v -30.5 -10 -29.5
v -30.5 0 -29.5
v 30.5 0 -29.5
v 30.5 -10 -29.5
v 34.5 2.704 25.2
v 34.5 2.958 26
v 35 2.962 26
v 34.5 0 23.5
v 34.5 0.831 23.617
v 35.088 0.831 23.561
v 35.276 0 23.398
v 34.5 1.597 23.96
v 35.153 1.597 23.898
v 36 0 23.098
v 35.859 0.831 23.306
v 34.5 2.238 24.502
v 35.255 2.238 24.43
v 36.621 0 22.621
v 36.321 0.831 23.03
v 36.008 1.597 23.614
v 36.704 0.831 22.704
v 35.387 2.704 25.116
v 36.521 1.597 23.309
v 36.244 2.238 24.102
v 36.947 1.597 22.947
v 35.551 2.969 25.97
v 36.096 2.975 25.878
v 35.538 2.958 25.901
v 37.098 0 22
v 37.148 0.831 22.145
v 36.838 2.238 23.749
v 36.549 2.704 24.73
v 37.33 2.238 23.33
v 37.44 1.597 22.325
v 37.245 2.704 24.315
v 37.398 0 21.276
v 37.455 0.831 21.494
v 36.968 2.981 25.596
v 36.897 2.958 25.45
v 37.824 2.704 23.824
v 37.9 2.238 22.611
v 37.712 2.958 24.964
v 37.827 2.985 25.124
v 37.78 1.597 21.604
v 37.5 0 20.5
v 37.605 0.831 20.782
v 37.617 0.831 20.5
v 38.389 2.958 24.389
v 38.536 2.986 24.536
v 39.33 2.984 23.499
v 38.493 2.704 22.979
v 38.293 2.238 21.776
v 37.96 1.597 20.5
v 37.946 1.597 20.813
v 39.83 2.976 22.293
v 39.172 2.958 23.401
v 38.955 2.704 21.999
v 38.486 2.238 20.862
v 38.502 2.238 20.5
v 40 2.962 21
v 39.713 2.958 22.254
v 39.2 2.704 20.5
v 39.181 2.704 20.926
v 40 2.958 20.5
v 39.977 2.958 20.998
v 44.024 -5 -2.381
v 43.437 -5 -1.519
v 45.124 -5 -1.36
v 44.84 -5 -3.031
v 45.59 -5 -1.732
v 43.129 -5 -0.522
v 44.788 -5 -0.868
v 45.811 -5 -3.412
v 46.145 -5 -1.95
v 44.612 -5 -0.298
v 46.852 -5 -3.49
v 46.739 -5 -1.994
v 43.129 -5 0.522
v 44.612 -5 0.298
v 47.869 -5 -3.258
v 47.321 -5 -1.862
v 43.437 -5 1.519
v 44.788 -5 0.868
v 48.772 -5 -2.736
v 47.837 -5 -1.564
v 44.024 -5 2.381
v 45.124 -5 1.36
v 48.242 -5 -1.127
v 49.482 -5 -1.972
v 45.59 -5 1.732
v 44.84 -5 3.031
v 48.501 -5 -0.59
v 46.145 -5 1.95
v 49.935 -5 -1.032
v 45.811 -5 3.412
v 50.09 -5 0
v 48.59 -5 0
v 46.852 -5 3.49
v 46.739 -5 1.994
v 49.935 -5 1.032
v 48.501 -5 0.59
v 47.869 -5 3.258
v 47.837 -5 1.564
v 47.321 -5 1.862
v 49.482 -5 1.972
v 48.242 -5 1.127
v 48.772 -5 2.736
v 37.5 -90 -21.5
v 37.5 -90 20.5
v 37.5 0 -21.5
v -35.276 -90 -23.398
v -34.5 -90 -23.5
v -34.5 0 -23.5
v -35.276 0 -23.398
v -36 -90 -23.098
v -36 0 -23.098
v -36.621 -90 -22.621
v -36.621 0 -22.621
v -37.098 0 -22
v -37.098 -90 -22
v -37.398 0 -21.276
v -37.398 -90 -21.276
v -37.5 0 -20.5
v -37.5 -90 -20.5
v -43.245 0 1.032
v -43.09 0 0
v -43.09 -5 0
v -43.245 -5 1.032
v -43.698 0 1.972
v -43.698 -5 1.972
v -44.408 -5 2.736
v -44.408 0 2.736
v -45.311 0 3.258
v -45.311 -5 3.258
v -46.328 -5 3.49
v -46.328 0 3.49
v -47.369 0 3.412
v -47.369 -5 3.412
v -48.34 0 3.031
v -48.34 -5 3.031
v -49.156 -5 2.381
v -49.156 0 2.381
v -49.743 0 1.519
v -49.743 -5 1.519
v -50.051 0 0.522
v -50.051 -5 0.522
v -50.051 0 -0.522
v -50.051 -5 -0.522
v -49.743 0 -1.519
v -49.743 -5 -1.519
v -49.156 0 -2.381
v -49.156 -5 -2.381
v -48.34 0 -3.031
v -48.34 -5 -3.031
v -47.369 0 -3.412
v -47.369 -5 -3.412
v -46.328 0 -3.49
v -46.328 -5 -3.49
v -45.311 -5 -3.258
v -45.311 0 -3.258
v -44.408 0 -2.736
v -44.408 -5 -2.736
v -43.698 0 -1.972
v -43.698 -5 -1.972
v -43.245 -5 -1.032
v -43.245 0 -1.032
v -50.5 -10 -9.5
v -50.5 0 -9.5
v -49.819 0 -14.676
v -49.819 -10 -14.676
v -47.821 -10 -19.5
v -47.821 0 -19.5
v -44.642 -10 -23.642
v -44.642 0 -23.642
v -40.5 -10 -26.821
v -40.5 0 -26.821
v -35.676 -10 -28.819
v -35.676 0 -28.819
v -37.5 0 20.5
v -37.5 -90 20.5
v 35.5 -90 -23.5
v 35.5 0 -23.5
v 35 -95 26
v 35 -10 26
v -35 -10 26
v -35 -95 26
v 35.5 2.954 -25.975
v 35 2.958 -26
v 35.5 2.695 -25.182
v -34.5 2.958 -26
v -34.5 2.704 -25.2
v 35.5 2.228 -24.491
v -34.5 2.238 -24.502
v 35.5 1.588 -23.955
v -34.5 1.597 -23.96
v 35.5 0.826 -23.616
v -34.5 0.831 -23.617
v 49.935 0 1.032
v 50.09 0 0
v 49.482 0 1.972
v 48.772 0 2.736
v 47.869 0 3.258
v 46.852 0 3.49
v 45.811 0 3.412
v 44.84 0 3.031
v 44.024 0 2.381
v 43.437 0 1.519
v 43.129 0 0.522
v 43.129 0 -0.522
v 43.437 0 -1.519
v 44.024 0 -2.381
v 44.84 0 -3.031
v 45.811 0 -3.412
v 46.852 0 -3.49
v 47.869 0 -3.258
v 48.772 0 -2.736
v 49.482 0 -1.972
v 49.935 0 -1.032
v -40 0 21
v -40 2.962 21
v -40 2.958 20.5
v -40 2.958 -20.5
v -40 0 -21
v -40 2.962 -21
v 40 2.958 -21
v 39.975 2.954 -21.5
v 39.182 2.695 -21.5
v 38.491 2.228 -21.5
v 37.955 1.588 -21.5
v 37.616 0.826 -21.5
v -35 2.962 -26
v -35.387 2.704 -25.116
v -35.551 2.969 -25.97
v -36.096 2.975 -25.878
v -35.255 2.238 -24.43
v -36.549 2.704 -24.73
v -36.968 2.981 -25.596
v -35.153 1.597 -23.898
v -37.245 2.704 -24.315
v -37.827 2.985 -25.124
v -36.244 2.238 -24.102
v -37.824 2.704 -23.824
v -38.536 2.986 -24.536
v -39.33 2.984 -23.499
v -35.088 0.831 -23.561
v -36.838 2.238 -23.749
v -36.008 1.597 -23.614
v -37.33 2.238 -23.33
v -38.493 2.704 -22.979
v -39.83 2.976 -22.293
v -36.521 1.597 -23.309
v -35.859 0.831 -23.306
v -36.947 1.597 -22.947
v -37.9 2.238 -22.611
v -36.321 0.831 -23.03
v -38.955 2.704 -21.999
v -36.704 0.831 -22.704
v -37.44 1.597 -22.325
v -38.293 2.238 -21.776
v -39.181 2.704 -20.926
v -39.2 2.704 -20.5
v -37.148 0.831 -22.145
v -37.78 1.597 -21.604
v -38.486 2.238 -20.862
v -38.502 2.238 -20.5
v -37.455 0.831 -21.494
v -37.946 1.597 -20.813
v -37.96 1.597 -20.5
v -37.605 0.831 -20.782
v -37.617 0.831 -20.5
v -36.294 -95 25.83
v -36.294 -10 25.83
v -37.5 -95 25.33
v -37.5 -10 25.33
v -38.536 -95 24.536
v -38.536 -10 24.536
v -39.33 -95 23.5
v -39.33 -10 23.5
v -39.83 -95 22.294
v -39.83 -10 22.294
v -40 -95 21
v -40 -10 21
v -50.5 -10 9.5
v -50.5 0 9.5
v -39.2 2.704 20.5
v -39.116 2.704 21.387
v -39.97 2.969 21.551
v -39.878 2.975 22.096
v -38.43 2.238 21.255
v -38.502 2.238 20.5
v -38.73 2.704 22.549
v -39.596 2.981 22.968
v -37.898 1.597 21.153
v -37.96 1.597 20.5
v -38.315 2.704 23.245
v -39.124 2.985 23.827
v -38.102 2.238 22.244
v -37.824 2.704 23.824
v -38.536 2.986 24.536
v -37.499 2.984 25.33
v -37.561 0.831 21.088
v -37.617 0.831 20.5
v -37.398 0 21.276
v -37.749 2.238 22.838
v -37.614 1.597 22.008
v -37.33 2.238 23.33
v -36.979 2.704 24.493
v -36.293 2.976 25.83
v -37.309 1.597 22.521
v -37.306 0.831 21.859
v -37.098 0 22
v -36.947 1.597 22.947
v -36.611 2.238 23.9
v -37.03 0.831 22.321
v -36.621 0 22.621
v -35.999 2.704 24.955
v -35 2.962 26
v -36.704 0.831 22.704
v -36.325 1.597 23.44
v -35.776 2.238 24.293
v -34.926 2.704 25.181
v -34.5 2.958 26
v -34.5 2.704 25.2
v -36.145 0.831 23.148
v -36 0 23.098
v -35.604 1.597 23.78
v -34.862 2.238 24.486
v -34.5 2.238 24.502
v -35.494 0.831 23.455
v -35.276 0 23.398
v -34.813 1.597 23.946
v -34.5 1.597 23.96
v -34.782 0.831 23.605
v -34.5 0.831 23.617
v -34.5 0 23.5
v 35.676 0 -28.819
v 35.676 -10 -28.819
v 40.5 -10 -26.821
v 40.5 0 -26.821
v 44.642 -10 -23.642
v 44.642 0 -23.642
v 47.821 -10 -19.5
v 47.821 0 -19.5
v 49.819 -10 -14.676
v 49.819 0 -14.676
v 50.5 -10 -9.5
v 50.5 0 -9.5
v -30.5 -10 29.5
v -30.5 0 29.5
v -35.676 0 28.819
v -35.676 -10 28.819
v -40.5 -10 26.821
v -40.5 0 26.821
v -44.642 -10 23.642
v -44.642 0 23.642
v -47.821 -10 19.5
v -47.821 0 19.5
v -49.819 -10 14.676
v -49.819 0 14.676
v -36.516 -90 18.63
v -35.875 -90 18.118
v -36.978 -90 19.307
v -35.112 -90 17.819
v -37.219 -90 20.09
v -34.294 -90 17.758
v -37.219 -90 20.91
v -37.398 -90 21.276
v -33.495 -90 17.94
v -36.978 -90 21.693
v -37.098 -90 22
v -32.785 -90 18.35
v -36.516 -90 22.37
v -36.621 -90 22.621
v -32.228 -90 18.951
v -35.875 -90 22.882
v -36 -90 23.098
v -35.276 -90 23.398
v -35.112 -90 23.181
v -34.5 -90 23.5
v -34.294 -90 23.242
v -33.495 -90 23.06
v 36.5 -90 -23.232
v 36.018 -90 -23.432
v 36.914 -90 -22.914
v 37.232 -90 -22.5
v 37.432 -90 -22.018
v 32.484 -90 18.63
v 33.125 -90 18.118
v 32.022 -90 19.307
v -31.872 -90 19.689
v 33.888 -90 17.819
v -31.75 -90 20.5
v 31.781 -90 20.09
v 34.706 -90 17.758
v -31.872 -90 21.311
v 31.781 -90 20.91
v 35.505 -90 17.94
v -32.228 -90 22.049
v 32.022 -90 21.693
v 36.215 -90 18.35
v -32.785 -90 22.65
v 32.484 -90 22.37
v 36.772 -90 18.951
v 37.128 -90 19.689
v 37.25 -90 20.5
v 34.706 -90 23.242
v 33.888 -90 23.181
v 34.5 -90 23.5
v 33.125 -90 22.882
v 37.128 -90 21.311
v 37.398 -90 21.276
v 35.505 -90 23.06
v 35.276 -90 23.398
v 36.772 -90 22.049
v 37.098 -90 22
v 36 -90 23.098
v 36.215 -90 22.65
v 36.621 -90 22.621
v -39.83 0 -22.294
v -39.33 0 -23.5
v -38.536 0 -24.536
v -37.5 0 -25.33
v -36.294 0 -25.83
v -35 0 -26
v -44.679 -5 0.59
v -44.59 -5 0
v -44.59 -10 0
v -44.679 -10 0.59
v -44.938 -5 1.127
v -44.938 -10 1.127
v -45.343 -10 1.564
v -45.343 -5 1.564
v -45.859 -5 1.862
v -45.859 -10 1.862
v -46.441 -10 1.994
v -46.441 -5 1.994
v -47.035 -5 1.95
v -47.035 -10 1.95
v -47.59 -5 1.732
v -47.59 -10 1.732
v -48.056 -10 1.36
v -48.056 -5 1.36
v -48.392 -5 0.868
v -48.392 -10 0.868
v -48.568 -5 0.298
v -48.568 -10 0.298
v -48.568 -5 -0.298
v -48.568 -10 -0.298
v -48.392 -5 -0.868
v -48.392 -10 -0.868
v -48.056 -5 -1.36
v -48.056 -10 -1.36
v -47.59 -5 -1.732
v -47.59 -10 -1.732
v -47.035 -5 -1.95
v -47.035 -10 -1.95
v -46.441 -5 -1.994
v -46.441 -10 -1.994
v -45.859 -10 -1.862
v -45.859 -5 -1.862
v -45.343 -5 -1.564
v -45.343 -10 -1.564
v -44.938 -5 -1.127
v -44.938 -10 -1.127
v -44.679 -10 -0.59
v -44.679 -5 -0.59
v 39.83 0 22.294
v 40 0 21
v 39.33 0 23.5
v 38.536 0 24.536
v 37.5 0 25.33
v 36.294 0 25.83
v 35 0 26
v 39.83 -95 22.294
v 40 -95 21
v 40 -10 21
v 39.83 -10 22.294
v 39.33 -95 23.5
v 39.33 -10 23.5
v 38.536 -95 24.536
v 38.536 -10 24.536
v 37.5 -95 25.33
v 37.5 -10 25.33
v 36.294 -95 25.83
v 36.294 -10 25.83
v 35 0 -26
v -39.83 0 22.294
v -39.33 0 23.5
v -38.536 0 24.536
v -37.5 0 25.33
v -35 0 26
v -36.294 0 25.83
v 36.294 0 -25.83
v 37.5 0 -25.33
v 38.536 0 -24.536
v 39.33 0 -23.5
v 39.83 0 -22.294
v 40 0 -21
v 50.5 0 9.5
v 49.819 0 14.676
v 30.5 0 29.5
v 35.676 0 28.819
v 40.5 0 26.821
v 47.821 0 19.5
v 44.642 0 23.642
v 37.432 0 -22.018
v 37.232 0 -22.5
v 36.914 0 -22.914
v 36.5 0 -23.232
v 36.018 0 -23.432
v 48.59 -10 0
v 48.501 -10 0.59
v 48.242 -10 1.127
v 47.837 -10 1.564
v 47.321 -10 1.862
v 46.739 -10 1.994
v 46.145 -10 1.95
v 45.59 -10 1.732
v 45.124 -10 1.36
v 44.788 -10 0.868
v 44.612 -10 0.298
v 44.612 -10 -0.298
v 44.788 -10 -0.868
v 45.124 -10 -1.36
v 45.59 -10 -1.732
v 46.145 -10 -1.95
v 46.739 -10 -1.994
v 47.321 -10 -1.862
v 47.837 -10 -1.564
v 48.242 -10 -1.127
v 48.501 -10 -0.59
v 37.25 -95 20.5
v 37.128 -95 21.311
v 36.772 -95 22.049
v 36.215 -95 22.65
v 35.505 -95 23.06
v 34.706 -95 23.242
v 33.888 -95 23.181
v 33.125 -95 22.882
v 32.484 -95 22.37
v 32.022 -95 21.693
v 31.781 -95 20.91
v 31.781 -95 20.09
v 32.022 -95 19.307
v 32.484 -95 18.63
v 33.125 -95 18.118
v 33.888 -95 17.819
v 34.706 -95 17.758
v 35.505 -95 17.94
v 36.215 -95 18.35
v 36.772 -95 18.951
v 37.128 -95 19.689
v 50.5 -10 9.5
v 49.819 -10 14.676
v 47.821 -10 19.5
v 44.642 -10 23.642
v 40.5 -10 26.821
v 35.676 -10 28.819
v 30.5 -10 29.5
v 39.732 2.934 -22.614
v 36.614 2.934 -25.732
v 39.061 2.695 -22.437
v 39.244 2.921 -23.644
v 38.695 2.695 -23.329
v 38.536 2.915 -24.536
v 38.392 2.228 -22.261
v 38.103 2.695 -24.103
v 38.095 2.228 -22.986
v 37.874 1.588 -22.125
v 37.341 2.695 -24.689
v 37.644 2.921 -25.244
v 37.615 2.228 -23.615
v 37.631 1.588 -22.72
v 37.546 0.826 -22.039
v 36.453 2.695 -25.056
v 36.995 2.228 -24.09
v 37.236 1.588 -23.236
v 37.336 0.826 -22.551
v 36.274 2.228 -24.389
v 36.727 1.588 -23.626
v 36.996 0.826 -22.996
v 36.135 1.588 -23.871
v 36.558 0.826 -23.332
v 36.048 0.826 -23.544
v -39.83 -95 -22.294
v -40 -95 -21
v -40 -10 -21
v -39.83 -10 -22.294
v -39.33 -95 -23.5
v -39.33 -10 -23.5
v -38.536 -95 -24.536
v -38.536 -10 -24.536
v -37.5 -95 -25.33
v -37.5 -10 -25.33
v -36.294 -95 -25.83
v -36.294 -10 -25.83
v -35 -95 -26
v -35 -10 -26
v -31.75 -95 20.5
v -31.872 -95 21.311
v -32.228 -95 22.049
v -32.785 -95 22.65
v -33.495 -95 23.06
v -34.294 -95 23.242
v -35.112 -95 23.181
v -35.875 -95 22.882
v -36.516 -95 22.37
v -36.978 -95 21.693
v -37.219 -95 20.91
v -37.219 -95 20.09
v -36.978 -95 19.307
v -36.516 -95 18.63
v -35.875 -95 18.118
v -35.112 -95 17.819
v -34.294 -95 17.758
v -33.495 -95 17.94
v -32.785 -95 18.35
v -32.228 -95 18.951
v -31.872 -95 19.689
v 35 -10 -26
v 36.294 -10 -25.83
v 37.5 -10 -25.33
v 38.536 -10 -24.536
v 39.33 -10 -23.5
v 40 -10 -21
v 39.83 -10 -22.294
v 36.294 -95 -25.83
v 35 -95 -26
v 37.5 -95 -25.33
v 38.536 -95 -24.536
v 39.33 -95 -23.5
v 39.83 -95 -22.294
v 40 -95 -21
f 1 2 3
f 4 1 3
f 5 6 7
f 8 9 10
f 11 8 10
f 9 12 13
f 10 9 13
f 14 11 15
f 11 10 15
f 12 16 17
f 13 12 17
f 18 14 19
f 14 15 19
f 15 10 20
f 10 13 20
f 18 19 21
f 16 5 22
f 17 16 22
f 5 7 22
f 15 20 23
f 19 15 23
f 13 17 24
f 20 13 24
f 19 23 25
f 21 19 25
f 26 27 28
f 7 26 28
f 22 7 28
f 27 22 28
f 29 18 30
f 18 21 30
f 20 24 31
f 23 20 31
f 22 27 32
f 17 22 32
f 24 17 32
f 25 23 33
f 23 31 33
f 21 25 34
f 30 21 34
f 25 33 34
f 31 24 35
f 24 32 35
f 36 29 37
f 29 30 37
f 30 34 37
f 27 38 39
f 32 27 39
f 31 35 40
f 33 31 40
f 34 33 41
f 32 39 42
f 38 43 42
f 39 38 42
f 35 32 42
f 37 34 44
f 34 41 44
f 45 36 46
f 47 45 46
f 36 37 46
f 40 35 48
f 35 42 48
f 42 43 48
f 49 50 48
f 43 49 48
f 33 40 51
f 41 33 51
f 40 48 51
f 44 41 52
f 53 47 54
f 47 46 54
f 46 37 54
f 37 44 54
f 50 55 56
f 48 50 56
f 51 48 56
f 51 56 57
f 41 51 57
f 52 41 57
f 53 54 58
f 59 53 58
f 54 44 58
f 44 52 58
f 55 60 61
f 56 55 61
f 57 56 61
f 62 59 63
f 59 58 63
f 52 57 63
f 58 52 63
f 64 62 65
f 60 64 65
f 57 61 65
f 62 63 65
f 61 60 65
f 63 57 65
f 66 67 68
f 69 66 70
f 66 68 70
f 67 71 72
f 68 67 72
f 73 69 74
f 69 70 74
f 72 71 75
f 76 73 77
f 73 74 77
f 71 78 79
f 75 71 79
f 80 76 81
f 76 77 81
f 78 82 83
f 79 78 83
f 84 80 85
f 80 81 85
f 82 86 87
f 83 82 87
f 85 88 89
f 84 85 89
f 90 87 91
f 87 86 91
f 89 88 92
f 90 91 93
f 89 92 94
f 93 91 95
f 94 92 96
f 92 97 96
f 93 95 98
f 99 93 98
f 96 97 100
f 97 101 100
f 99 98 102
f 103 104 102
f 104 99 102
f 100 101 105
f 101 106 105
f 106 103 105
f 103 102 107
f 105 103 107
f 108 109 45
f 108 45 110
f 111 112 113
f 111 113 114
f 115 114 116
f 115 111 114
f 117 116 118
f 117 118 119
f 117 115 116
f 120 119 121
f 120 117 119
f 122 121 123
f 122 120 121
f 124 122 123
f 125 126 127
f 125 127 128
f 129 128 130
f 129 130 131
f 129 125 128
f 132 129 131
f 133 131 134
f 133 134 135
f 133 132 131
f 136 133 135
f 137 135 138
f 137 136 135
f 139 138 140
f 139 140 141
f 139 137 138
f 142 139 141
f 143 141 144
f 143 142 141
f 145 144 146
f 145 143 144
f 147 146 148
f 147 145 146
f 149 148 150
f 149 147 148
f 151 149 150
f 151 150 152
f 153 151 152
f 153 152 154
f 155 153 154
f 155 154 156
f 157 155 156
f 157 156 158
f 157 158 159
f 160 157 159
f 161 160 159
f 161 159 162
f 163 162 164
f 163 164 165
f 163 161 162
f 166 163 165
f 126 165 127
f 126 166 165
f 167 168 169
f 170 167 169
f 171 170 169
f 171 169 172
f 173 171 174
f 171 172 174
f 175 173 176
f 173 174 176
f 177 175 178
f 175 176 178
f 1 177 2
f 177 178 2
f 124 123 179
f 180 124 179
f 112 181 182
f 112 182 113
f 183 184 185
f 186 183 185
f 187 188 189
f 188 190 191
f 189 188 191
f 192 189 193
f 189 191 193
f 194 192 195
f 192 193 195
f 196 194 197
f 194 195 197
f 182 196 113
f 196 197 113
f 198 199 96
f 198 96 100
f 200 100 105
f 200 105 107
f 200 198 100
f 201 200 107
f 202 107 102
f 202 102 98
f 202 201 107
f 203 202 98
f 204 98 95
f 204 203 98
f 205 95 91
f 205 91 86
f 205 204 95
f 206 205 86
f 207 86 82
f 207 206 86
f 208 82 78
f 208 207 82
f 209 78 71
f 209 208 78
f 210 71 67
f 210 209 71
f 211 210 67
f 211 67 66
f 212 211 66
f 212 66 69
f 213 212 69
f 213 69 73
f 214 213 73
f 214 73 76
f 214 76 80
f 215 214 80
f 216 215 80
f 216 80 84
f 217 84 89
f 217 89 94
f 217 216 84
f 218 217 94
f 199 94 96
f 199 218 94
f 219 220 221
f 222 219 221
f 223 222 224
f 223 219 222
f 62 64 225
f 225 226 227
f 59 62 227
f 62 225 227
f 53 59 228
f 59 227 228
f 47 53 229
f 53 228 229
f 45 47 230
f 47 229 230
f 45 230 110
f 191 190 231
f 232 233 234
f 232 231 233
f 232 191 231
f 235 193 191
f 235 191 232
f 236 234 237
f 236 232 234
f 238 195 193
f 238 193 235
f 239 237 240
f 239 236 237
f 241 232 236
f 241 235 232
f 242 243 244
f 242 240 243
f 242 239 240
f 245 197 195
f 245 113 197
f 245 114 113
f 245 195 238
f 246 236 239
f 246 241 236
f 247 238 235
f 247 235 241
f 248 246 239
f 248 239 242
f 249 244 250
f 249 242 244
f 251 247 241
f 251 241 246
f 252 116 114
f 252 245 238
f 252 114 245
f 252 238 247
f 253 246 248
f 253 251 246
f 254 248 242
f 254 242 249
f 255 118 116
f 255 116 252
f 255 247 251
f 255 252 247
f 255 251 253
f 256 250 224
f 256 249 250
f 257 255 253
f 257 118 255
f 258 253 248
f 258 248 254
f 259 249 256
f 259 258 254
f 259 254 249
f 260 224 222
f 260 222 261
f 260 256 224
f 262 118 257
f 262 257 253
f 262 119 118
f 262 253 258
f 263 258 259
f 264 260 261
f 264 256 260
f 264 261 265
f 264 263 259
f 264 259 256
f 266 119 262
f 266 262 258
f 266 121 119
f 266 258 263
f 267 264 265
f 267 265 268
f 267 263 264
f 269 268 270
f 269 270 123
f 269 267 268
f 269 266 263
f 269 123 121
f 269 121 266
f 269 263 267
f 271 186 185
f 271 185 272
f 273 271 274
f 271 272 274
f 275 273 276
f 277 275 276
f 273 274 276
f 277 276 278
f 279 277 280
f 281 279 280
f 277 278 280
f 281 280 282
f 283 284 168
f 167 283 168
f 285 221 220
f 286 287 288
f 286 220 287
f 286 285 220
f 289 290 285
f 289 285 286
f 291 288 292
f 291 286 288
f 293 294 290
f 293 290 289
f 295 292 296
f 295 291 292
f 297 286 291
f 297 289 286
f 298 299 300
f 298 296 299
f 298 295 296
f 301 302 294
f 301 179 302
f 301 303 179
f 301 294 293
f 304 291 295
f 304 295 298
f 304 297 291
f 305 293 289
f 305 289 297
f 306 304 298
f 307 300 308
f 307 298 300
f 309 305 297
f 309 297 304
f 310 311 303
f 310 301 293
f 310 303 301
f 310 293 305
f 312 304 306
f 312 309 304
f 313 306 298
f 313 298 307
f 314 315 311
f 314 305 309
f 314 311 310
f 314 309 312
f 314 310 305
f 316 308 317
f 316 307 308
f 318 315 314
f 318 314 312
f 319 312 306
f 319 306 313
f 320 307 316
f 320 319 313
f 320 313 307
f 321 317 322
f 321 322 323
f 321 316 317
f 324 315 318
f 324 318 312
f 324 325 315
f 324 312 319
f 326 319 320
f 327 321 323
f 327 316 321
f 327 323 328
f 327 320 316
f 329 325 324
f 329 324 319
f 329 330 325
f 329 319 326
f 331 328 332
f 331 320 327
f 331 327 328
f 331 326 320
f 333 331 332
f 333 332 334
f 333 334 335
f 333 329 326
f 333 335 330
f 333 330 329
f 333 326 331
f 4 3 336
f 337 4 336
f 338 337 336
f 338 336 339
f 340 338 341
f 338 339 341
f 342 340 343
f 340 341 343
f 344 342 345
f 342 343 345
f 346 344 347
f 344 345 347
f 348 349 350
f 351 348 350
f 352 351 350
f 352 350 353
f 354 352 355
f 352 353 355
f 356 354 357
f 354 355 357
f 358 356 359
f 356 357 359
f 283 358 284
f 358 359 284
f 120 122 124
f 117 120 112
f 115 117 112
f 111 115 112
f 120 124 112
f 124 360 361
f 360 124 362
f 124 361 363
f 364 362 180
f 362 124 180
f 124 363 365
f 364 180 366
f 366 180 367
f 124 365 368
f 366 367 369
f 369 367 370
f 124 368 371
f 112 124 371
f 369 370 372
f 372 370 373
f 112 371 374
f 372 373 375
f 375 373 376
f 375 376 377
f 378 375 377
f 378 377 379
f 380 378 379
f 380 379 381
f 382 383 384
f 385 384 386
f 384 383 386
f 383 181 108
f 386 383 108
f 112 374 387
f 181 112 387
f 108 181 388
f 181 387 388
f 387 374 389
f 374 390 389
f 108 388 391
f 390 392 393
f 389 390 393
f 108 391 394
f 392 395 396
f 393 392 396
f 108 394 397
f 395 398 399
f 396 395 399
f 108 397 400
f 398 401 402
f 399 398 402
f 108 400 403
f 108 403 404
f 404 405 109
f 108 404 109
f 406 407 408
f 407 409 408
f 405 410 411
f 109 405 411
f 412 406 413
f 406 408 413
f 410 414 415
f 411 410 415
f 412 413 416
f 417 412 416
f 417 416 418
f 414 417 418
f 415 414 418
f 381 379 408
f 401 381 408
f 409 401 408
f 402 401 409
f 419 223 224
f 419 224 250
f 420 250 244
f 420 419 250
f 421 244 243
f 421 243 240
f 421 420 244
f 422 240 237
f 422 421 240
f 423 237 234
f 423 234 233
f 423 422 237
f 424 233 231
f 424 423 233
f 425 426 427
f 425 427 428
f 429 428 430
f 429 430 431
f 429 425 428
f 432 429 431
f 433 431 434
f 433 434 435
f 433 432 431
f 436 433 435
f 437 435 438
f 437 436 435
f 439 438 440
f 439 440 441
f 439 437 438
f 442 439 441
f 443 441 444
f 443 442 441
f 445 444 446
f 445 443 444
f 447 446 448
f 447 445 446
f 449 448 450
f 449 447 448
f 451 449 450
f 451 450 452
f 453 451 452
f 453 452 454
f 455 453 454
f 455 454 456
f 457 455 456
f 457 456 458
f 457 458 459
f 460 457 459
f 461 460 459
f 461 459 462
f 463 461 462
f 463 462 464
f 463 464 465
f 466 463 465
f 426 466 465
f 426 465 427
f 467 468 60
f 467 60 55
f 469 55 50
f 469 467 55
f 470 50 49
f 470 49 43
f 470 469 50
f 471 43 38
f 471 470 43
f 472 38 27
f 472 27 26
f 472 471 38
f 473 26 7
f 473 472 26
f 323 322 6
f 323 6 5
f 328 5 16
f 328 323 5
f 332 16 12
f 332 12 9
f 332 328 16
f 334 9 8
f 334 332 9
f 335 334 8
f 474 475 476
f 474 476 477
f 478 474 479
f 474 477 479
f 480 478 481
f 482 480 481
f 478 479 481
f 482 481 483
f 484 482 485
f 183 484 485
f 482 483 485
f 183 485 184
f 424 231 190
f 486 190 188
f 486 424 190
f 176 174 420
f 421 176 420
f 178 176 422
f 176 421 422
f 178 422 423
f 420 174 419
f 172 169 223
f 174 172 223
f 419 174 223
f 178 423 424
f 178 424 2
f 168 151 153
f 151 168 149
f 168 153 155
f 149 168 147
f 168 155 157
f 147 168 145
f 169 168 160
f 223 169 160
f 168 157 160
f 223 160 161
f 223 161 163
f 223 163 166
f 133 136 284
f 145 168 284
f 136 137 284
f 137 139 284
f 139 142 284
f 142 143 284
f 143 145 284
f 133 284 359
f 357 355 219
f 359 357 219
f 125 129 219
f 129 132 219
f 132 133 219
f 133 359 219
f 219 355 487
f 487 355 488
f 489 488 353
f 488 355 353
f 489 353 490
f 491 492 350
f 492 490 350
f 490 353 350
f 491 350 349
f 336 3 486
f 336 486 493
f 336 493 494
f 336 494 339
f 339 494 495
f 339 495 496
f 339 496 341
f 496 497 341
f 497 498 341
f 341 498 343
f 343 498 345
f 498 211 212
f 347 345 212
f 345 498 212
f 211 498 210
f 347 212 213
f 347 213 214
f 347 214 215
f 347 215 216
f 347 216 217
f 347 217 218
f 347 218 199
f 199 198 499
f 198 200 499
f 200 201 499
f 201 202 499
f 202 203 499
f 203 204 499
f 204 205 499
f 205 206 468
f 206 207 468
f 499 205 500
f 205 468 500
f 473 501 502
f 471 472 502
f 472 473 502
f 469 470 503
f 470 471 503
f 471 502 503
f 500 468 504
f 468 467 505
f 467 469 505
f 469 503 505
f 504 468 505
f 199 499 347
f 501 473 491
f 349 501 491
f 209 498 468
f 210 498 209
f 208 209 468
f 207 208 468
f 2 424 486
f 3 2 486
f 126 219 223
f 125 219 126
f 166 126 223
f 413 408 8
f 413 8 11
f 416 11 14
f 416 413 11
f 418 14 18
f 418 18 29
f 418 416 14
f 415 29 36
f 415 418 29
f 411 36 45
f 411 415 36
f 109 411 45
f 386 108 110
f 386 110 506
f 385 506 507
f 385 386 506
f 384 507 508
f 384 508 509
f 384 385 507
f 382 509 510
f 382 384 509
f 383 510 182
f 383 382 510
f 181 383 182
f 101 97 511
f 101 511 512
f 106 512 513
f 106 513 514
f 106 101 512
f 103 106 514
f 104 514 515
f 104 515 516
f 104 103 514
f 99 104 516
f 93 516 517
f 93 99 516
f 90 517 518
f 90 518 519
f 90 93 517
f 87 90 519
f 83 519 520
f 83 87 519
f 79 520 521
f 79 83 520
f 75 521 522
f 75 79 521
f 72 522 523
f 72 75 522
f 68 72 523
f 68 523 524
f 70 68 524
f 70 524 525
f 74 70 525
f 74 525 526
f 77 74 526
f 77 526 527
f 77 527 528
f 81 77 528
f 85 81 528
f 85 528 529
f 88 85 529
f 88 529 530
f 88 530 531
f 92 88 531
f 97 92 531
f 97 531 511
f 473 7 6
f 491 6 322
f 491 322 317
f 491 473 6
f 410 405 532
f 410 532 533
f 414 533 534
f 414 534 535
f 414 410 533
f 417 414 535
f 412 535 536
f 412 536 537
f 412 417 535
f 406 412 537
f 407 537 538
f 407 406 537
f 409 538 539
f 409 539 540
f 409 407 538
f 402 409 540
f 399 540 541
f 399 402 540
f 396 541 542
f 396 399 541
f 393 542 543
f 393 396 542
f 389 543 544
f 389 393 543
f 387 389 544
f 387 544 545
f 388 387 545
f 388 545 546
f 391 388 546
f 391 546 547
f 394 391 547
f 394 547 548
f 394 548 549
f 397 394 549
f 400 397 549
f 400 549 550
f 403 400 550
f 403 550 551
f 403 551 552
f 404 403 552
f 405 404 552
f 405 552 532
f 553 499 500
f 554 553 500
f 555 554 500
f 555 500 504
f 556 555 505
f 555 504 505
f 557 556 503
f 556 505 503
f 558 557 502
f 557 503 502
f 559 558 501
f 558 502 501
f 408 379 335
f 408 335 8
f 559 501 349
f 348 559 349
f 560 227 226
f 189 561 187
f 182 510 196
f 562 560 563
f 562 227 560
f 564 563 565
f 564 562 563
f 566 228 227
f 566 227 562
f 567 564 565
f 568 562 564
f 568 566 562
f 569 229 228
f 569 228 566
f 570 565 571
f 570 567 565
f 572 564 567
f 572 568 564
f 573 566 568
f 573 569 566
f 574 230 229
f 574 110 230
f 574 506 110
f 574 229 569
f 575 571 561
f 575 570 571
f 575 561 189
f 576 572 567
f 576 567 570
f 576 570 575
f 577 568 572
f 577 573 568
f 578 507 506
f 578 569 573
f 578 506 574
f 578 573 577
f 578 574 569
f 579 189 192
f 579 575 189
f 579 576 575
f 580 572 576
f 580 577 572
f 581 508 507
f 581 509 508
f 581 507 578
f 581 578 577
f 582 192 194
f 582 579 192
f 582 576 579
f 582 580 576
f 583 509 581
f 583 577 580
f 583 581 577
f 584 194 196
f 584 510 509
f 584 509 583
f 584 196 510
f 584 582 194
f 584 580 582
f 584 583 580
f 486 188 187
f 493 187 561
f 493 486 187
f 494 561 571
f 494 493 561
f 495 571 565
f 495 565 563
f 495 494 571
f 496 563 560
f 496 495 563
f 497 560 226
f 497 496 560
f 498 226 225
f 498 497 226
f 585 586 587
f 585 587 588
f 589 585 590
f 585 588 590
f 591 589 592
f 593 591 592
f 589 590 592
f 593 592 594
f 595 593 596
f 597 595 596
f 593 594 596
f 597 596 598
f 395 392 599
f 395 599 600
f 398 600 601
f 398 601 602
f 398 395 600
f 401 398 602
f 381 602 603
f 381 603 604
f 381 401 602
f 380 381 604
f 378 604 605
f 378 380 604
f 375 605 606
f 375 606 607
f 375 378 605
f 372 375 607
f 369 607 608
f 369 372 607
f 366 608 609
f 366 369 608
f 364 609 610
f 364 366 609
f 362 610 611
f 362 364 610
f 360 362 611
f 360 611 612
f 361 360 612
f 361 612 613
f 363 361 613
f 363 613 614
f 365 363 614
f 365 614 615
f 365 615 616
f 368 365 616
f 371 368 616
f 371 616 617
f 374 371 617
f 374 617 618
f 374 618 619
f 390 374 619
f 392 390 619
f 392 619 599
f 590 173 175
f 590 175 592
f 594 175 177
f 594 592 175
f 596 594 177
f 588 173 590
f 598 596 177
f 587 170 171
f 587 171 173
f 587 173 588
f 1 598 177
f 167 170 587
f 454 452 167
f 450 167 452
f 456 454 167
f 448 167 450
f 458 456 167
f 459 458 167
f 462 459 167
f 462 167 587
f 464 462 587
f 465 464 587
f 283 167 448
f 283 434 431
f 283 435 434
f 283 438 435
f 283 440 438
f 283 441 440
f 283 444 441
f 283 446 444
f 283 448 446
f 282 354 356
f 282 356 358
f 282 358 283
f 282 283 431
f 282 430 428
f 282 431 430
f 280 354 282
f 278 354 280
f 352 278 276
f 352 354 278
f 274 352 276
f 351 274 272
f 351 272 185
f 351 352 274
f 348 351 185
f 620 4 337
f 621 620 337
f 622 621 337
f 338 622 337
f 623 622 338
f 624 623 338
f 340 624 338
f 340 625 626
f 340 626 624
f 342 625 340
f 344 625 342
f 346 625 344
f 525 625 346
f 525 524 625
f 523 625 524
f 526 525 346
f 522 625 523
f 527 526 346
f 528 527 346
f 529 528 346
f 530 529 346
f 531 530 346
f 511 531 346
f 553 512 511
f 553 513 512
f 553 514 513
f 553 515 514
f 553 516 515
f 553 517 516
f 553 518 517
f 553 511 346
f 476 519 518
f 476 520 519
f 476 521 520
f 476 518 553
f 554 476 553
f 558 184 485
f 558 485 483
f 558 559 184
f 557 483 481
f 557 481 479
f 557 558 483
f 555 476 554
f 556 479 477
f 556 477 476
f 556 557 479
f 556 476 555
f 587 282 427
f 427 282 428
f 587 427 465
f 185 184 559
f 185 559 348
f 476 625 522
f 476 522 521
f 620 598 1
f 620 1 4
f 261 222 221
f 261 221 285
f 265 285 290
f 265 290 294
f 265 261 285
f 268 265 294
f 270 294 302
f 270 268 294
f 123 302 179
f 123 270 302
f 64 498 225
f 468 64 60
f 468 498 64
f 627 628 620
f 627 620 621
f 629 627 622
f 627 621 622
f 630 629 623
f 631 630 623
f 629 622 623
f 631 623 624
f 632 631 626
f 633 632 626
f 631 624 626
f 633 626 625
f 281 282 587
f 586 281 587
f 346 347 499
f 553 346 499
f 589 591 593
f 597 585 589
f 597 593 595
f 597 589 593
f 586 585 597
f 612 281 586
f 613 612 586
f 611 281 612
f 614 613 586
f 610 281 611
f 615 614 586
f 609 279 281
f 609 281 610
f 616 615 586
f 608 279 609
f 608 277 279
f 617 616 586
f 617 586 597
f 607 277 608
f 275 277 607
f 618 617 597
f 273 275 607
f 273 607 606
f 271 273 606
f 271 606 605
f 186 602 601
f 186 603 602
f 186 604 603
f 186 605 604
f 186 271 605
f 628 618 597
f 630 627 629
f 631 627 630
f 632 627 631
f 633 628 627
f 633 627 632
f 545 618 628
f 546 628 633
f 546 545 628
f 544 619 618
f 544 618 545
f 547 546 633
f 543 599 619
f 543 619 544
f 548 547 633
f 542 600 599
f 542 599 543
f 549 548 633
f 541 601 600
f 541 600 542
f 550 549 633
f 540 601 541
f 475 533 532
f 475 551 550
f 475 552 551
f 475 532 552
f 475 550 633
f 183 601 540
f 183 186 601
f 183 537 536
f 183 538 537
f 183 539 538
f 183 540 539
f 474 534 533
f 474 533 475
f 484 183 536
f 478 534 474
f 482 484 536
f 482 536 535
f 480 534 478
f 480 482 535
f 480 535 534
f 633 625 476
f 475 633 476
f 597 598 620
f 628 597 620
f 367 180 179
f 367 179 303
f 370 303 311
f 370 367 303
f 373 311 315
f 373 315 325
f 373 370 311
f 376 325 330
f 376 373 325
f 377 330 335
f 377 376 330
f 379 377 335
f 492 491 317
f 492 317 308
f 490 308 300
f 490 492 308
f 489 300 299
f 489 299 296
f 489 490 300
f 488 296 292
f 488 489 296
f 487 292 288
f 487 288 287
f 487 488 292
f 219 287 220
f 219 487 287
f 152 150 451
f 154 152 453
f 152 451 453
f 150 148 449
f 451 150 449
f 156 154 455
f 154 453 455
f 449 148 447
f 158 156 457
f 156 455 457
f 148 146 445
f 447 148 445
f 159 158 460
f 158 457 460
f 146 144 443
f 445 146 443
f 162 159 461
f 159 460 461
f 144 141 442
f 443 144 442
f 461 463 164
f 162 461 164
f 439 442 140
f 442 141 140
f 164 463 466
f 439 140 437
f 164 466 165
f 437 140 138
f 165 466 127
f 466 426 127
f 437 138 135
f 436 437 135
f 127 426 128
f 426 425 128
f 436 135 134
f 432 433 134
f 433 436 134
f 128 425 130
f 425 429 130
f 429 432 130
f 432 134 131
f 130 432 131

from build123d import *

# Parameters (mm, degrees)
F0_R         = 3.5
F1_DEPTH     = 10
F0_R_2       = 2.75
F2_DEPTH     = 95
F3_DEPTH     = 90
F4_DEPTH     = 3
F5_T1_DEPTH  = 41
F5_T3_DEPTH  = 70
F5_T5_DEPTH  = 42
F5_T7_DEPTH  = 69
F5_T10_ANGLE = 90
F5_T12_ANGLE = 90
F5_T14_ANGLE = 90
F5_T16_ANGLE = 90
F0_R_3       = 2
F6_DEPTH     = 10
F7_DEPTH     = 5


# Not quite as in the source:
# - a fillet or chamfer that OpenCascade refuses, or shapes differently, is made with other operations: its cross-section is extruded or revolved along the edge and cut away or added


with BuildPart() as f1:
    # F0 (on Front) → F1 (new body)
    with BuildSketch(Plane.XZ):
        with BuildLine():
            Line((30.5, 29.5), (-30.5, 29.5))
            ThreePointArc((-30.5, 29.5), (-44.6421356237, 23.6421356237), (-50.5, 9.5))
            Line((-50.5, 9.5), (-50.5, -9.5))
            ThreePointArc((-50.5, -9.5), (-44.6421356237, -23.6421356237), (-30.5, -29.5))
            Line((-30.5, -29.5), (30.5, -29.5))
            ThreePointArc((30.5, -29.5), (44.6421356237, -23.6421356237), (50.5, -9.5))
            Line((50.5, -9.5), (50.5, 9.5))
            ThreePointArc((50.5, 9.5), (44.6421356237, 23.6421356237), (30.5, 29.5))
        make_face()
        with Locations((-46.59, 0)):
            Circle(F0_R, mode=Mode.SUBTRACT)
        with BuildLine():
            ThreePointArc((-40, 21), (-38.5355339059, 24.5355339059), (-35, 26))
            Line((-35, 26), (35, 26))
            ThreePointArc((35, 26), (38.5355339059, 24.5355339059), (40, 21))
            Line((40, 21), (40, -21))
            ThreePointArc((40, -21), (38.5355339059, -24.5355339059), (35, -26))
            Line((35, -26), (-35, -26))
            ThreePointArc((-35, -26), (-38.5355339059, -24.5355339059), (-40, -21))
            Line((-40, -21), (-40, 21))
        make_face(mode=Mode.SUBTRACT)
        with Locations((46.59, 0)):
            Circle(F0_R, mode=Mode.SUBTRACT)
    extrude(amount=F1_DEPTH)

    # F0 (on Front) → F2 (join)
    with BuildSketch(Plane.XZ):
        with BuildLine():
            Line((35, 26), (-35, 26))
            ThreePointArc((-35, 26), (-38.5355339059, 24.5355339059), (-40, 21))
            Line((-40, 21), (-40, -21))
            ThreePointArc((-40, -21), (-38.5355339059, -24.5355339059), (-35, -26))
            Line((-35, -26), (35, -26))
            ThreePointArc((35, -26), (38.5355339059, -24.5355339059), (40, -21))
            Line((40, -21), (40, 21))
            ThreePointArc((40, 21), (38.5355339059, 24.5355339059), (35, 26))
        make_face()
        with BuildLine():
            ThreePointArc((-37.5, 20.5), (-36.6213203436, 22.6213203436), (-34.5, 23.5))
            Line((-34.5, 23.5), (34.5, 23.5))
            ThreePointArc((34.5, 23.5), (36.6213203436, 22.6213203436), (37.5, 20.5))
            Line((37.5, 20.5), (37.5, -21.5))
            ThreePointArc((37.5, -21.5), (36.9142135624, -22.9142135624), (35.5, -23.5))
            Line((35.5, -23.5), (-34.5, -23.5))
            ThreePointArc((-34.5, -23.5), (-36.6213203436, -22.6213203436), (-37.5, -20.5))
            Line((-37.5, -20.5), (-37.5, 20.5))
        make_face(mode=Mode.SUBTRACT)
        with BuildLine():
            Line((34.5, 23.5), (-34.5, 23.5))
            ThreePointArc((-34.5, 23.5), (-36.6213203436, 22.6213203436), (-37.5, 20.5))
            Line((-37.5, 20.5), (-37.5, -20.5))
            ThreePointArc((-37.5, -20.5), (-36.6213203436, -22.6213203436), (-34.5, -23.5))
            Line((-34.5, -23.5), (35.5, -23.5))
            ThreePointArc((35.5, -23.5), (36.9142135624, -22.9142135624), (37.5, -21.5))
            Line((37.5, -21.5), (37.5, 20.5))
            ThreePointArc((37.5, 20.5), (36.6213203436, 22.6213203436), (34.5, 23.5))
        make_face()
        with Locations((-34.5, 20.5)):
            Circle(F0_R_2, mode=Mode.SUBTRACT)
        with Locations((34.5, 20.5)):
            Circle(F0_R_2, mode=Mode.SUBTRACT)
    extrude(amount=F2_DEPTH)

    # F0 (on Front) → F3 (cut)
    with BuildSketch(Plane.XZ):
        with BuildLine():
            Line((34.5, 23.5), (-34.5, 23.5))
            ThreePointArc((-34.5, 23.5), (-36.6213203436, 22.6213203436), (-37.5, 20.5))
            Line((-37.5, 20.5), (-37.5, -20.5))
            ThreePointArc((-37.5, -20.5), (-36.6213203436, -22.6213203436), (-34.5, -23.5))
            Line((-34.5, -23.5), (35.5, -23.5))
            ThreePointArc((35.5, -23.5), (36.9142135624, -22.9142135624), (37.5, -21.5))
            Line((37.5, -21.5), (37.5, 20.5))
            ThreePointArc((37.5, 20.5), (36.6213203436, 22.6213203436), (34.5, 23.5))
        make_face()
        with Locations((-34.5, 20.5)):
            Circle(F0_R_2, mode=Mode.SUBTRACT)
        with Locations((34.5, 20.5)):
            Circle(F0_R_2, mode=Mode.SUBTRACT)
    extrude(amount=F3_DEPTH, mode=Mode.SUBTRACT)

    # F0 (on Front) → F4 (join)
    with BuildSketch(Plane.XZ):
        with BuildLine():
            Line((35, 26), (-35, 26))
            ThreePointArc((-35, 26), (-38.5355339059, 24.5355339059), (-40, 21))
            Line((-40, 21), (-40, -21))
            ThreePointArc((-40, -21), (-38.5355339059, -24.5355339059), (-35, -26))
            Line((-35, -26), (35, -26))
            ThreePointArc((35, -26), (38.5355339059, -24.5355339059), (40, -21))
            Line((40, -21), (40, 21))
            ThreePointArc((40, 21), (38.5355339059, 24.5355339059), (35, 26))
        make_face()
        with BuildLine():
            ThreePointArc((-37.5, 20.5), (-36.6213203436, 22.6213203436), (-34.5, 23.5))
            Line((-34.5, 23.5), (34.5, 23.5))
            ThreePointArc((34.5, 23.5), (36.6213203436, 22.6213203436), (37.5, 20.5))
            Line((37.5, 20.5), (37.5, -21.5))
            ThreePointArc((37.5, -21.5), (36.9142135624, -22.9142135624), (35.5, -23.5))
            Line((35.5, -23.5), (-34.5, -23.5))
            ThreePointArc((-34.5, -23.5), (-36.6213203436, -22.6213203436), (-37.5, -20.5))
            Line((-37.5, -20.5), (-37.5, 20.5))
        make_face(mode=Mode.SUBTRACT)
    extrude(amount=-F4_DEPTH)

    # F5: fillet of radius 3 on 2 edges, made by hand

    # F5_s2 → F5_t1 (cut)
    with BuildSketch(Plane.XY.offset(-20.5)):
        with BuildLine():
            ThreePointArc((-40.5, 3), (-38.3786796564, 2.1213203436), (-37.5, 0))
            Line((-37.5, 0), (-37.5, 3))
            Line((-37.5, 3), (-40.5, 3))
        make_face()
    extrude(amount=F5_T1_DEPTH, mode=Mode.SUBTRACT)

    # F5_s4 → F5_t3 (cut)
    with BuildSketch(Plane.YZ.offset(-34.5)):
        with BuildLine():
            ThreePointArc((3, -26.5), (2.1213203436, -24.3786796564), (0, -23.5))
            Line((0, -23.5), (3, -23.5))
            Line((3, -23.5), (3, -26.5))
        make_face()
    extrude(amount=F5_T3_DEPTH, mode=Mode.SUBTRACT)

    # F5_s6 → F5_t5 (cut)
    with BuildSketch(Plane.XY.offset(-21.5)):
        with BuildLine():
            ThreePointArc((40.5, 3), (38.3786796564, 2.1213203436), (37.5, 0))
            Line((37.5, 0), (37.5, 3))
            Line((37.5, 3), (40.5, 3))
        make_face()
    extrude(amount=F5_T5_DEPTH, mode=Mode.SUBTRACT)

    # F5_s8 → F5_t7 (cut)
    with BuildSketch(Plane.YZ.offset(-34.5)):
        with BuildLine():
            ThreePointArc((3, 26.5), (2.1213203436, 24.3786796564), (0, 23.5))
            Line((0, 23.5), (3, 23.5))
            Line((3, 23.5), (3, 26.5))
        make_face()
    extrude(amount=F5_T7_DEPTH, mode=Mode.SUBTRACT)

    # F5_s9 → F5_t10 (revolve, cut)
    with BuildSketch(Plane.XY.offset(-21.5)):
        with BuildLine():
            ThreePointArc((40.5, 3), (38.3786796564, 2.1213203436), (37.5, 0))
            Line((37.5, 0), (37.5, 3))
            Line((37.5, 3), (40.5, 3))
        make_face()
    revolve(axis=Axis((35.5, 3, -21.5), (0, 1, 0)), revolution_arc=F5_T10_ANGLE, mode=Mode.SUBTRACT)

    # F5_s11 → F5_t12 (revolve, cut)
    with BuildSketch(Plane.YZ.offset(-34.5)):
        with BuildLine():
            ThreePointArc((3, -26.5), (2.1213203436, -24.3786796564), (0, -23.5))
            Line((0, -23.5), (3, -23.5))
            Line((3, -23.5), (3, -26.5))
        make_face()
    revolve(axis=Axis((-34.5, 3, -20.5), (0, 1, 0)), revolution_arc=F5_T12_ANGLE, mode=Mode.SUBTRACT)

    # F5_s13 → F5_t14 (revolve, cut)
    with BuildSketch(Plane.YZ.offset(34.5)):
        with BuildLine():
            ThreePointArc((0, 23.5), (2.1213203436, 24.3786796564), (3, 26.5))
            Line((3, 26.5), (3, 23.5))
            Line((3, 23.5), (0, 23.5))
        make_face()
    revolve(axis=Axis((34.5, 3, 20.5), (0, 1, 0)), revolution_arc=F5_T14_ANGLE, mode=Mode.SUBTRACT)

    # F5_s15 → F5_t16 (revolve, cut)
    with BuildSketch(Plane.XY.offset(20.5)):
        with BuildLine():
            ThreePointArc((-40.5, 3), (-38.3786796564, 2.1213203436), (-37.5, 0))
            Line((-37.5, 0), (-37.5, 3))
            Line((-37.5, 3), (-40.5, 3))
        make_face()
    revolve(axis=Axis((-34.5, 3, 20.5), (0, 1, 0)), revolution_arc=F5_T16_ANGLE, mode=Mode.SUBTRACT)

    # F0 (on Front) → F6 (join)
    with BuildSketch(Plane.XZ):
        with Locations((46.59, 0)):
            Circle(F0_R)
        with Locations((46.59, 0)):
            Circle(F0_R_3, mode=Mode.SUBTRACT)
        with Locations((-46.59, 0)):
            Circle(F0_R)
        with Locations((-46.59, 0)):
            Circle(F0_R_3, mode=Mode.SUBTRACT)
    extrude(amount=F6_DEPTH)

    # F0 (on Front) → F7 (cut)
    with BuildSketch(Plane.XZ):
        with Locations((46.59, 0)):
            Circle(F0_R)
        with Locations((46.59, 0)):
            Circle(F0_R_3, mode=Mode.SUBTRACT)
        with Locations((-46.59, 0)):
            Circle(F0_R)
        with Locations((-46.59, 0)):
            Circle(F0_R_3, mode=Mode.SUBTRACT)
    extrude(amount=F7_DEPTH, mode=Mode.SUBTRACT)


solid = f1.part
